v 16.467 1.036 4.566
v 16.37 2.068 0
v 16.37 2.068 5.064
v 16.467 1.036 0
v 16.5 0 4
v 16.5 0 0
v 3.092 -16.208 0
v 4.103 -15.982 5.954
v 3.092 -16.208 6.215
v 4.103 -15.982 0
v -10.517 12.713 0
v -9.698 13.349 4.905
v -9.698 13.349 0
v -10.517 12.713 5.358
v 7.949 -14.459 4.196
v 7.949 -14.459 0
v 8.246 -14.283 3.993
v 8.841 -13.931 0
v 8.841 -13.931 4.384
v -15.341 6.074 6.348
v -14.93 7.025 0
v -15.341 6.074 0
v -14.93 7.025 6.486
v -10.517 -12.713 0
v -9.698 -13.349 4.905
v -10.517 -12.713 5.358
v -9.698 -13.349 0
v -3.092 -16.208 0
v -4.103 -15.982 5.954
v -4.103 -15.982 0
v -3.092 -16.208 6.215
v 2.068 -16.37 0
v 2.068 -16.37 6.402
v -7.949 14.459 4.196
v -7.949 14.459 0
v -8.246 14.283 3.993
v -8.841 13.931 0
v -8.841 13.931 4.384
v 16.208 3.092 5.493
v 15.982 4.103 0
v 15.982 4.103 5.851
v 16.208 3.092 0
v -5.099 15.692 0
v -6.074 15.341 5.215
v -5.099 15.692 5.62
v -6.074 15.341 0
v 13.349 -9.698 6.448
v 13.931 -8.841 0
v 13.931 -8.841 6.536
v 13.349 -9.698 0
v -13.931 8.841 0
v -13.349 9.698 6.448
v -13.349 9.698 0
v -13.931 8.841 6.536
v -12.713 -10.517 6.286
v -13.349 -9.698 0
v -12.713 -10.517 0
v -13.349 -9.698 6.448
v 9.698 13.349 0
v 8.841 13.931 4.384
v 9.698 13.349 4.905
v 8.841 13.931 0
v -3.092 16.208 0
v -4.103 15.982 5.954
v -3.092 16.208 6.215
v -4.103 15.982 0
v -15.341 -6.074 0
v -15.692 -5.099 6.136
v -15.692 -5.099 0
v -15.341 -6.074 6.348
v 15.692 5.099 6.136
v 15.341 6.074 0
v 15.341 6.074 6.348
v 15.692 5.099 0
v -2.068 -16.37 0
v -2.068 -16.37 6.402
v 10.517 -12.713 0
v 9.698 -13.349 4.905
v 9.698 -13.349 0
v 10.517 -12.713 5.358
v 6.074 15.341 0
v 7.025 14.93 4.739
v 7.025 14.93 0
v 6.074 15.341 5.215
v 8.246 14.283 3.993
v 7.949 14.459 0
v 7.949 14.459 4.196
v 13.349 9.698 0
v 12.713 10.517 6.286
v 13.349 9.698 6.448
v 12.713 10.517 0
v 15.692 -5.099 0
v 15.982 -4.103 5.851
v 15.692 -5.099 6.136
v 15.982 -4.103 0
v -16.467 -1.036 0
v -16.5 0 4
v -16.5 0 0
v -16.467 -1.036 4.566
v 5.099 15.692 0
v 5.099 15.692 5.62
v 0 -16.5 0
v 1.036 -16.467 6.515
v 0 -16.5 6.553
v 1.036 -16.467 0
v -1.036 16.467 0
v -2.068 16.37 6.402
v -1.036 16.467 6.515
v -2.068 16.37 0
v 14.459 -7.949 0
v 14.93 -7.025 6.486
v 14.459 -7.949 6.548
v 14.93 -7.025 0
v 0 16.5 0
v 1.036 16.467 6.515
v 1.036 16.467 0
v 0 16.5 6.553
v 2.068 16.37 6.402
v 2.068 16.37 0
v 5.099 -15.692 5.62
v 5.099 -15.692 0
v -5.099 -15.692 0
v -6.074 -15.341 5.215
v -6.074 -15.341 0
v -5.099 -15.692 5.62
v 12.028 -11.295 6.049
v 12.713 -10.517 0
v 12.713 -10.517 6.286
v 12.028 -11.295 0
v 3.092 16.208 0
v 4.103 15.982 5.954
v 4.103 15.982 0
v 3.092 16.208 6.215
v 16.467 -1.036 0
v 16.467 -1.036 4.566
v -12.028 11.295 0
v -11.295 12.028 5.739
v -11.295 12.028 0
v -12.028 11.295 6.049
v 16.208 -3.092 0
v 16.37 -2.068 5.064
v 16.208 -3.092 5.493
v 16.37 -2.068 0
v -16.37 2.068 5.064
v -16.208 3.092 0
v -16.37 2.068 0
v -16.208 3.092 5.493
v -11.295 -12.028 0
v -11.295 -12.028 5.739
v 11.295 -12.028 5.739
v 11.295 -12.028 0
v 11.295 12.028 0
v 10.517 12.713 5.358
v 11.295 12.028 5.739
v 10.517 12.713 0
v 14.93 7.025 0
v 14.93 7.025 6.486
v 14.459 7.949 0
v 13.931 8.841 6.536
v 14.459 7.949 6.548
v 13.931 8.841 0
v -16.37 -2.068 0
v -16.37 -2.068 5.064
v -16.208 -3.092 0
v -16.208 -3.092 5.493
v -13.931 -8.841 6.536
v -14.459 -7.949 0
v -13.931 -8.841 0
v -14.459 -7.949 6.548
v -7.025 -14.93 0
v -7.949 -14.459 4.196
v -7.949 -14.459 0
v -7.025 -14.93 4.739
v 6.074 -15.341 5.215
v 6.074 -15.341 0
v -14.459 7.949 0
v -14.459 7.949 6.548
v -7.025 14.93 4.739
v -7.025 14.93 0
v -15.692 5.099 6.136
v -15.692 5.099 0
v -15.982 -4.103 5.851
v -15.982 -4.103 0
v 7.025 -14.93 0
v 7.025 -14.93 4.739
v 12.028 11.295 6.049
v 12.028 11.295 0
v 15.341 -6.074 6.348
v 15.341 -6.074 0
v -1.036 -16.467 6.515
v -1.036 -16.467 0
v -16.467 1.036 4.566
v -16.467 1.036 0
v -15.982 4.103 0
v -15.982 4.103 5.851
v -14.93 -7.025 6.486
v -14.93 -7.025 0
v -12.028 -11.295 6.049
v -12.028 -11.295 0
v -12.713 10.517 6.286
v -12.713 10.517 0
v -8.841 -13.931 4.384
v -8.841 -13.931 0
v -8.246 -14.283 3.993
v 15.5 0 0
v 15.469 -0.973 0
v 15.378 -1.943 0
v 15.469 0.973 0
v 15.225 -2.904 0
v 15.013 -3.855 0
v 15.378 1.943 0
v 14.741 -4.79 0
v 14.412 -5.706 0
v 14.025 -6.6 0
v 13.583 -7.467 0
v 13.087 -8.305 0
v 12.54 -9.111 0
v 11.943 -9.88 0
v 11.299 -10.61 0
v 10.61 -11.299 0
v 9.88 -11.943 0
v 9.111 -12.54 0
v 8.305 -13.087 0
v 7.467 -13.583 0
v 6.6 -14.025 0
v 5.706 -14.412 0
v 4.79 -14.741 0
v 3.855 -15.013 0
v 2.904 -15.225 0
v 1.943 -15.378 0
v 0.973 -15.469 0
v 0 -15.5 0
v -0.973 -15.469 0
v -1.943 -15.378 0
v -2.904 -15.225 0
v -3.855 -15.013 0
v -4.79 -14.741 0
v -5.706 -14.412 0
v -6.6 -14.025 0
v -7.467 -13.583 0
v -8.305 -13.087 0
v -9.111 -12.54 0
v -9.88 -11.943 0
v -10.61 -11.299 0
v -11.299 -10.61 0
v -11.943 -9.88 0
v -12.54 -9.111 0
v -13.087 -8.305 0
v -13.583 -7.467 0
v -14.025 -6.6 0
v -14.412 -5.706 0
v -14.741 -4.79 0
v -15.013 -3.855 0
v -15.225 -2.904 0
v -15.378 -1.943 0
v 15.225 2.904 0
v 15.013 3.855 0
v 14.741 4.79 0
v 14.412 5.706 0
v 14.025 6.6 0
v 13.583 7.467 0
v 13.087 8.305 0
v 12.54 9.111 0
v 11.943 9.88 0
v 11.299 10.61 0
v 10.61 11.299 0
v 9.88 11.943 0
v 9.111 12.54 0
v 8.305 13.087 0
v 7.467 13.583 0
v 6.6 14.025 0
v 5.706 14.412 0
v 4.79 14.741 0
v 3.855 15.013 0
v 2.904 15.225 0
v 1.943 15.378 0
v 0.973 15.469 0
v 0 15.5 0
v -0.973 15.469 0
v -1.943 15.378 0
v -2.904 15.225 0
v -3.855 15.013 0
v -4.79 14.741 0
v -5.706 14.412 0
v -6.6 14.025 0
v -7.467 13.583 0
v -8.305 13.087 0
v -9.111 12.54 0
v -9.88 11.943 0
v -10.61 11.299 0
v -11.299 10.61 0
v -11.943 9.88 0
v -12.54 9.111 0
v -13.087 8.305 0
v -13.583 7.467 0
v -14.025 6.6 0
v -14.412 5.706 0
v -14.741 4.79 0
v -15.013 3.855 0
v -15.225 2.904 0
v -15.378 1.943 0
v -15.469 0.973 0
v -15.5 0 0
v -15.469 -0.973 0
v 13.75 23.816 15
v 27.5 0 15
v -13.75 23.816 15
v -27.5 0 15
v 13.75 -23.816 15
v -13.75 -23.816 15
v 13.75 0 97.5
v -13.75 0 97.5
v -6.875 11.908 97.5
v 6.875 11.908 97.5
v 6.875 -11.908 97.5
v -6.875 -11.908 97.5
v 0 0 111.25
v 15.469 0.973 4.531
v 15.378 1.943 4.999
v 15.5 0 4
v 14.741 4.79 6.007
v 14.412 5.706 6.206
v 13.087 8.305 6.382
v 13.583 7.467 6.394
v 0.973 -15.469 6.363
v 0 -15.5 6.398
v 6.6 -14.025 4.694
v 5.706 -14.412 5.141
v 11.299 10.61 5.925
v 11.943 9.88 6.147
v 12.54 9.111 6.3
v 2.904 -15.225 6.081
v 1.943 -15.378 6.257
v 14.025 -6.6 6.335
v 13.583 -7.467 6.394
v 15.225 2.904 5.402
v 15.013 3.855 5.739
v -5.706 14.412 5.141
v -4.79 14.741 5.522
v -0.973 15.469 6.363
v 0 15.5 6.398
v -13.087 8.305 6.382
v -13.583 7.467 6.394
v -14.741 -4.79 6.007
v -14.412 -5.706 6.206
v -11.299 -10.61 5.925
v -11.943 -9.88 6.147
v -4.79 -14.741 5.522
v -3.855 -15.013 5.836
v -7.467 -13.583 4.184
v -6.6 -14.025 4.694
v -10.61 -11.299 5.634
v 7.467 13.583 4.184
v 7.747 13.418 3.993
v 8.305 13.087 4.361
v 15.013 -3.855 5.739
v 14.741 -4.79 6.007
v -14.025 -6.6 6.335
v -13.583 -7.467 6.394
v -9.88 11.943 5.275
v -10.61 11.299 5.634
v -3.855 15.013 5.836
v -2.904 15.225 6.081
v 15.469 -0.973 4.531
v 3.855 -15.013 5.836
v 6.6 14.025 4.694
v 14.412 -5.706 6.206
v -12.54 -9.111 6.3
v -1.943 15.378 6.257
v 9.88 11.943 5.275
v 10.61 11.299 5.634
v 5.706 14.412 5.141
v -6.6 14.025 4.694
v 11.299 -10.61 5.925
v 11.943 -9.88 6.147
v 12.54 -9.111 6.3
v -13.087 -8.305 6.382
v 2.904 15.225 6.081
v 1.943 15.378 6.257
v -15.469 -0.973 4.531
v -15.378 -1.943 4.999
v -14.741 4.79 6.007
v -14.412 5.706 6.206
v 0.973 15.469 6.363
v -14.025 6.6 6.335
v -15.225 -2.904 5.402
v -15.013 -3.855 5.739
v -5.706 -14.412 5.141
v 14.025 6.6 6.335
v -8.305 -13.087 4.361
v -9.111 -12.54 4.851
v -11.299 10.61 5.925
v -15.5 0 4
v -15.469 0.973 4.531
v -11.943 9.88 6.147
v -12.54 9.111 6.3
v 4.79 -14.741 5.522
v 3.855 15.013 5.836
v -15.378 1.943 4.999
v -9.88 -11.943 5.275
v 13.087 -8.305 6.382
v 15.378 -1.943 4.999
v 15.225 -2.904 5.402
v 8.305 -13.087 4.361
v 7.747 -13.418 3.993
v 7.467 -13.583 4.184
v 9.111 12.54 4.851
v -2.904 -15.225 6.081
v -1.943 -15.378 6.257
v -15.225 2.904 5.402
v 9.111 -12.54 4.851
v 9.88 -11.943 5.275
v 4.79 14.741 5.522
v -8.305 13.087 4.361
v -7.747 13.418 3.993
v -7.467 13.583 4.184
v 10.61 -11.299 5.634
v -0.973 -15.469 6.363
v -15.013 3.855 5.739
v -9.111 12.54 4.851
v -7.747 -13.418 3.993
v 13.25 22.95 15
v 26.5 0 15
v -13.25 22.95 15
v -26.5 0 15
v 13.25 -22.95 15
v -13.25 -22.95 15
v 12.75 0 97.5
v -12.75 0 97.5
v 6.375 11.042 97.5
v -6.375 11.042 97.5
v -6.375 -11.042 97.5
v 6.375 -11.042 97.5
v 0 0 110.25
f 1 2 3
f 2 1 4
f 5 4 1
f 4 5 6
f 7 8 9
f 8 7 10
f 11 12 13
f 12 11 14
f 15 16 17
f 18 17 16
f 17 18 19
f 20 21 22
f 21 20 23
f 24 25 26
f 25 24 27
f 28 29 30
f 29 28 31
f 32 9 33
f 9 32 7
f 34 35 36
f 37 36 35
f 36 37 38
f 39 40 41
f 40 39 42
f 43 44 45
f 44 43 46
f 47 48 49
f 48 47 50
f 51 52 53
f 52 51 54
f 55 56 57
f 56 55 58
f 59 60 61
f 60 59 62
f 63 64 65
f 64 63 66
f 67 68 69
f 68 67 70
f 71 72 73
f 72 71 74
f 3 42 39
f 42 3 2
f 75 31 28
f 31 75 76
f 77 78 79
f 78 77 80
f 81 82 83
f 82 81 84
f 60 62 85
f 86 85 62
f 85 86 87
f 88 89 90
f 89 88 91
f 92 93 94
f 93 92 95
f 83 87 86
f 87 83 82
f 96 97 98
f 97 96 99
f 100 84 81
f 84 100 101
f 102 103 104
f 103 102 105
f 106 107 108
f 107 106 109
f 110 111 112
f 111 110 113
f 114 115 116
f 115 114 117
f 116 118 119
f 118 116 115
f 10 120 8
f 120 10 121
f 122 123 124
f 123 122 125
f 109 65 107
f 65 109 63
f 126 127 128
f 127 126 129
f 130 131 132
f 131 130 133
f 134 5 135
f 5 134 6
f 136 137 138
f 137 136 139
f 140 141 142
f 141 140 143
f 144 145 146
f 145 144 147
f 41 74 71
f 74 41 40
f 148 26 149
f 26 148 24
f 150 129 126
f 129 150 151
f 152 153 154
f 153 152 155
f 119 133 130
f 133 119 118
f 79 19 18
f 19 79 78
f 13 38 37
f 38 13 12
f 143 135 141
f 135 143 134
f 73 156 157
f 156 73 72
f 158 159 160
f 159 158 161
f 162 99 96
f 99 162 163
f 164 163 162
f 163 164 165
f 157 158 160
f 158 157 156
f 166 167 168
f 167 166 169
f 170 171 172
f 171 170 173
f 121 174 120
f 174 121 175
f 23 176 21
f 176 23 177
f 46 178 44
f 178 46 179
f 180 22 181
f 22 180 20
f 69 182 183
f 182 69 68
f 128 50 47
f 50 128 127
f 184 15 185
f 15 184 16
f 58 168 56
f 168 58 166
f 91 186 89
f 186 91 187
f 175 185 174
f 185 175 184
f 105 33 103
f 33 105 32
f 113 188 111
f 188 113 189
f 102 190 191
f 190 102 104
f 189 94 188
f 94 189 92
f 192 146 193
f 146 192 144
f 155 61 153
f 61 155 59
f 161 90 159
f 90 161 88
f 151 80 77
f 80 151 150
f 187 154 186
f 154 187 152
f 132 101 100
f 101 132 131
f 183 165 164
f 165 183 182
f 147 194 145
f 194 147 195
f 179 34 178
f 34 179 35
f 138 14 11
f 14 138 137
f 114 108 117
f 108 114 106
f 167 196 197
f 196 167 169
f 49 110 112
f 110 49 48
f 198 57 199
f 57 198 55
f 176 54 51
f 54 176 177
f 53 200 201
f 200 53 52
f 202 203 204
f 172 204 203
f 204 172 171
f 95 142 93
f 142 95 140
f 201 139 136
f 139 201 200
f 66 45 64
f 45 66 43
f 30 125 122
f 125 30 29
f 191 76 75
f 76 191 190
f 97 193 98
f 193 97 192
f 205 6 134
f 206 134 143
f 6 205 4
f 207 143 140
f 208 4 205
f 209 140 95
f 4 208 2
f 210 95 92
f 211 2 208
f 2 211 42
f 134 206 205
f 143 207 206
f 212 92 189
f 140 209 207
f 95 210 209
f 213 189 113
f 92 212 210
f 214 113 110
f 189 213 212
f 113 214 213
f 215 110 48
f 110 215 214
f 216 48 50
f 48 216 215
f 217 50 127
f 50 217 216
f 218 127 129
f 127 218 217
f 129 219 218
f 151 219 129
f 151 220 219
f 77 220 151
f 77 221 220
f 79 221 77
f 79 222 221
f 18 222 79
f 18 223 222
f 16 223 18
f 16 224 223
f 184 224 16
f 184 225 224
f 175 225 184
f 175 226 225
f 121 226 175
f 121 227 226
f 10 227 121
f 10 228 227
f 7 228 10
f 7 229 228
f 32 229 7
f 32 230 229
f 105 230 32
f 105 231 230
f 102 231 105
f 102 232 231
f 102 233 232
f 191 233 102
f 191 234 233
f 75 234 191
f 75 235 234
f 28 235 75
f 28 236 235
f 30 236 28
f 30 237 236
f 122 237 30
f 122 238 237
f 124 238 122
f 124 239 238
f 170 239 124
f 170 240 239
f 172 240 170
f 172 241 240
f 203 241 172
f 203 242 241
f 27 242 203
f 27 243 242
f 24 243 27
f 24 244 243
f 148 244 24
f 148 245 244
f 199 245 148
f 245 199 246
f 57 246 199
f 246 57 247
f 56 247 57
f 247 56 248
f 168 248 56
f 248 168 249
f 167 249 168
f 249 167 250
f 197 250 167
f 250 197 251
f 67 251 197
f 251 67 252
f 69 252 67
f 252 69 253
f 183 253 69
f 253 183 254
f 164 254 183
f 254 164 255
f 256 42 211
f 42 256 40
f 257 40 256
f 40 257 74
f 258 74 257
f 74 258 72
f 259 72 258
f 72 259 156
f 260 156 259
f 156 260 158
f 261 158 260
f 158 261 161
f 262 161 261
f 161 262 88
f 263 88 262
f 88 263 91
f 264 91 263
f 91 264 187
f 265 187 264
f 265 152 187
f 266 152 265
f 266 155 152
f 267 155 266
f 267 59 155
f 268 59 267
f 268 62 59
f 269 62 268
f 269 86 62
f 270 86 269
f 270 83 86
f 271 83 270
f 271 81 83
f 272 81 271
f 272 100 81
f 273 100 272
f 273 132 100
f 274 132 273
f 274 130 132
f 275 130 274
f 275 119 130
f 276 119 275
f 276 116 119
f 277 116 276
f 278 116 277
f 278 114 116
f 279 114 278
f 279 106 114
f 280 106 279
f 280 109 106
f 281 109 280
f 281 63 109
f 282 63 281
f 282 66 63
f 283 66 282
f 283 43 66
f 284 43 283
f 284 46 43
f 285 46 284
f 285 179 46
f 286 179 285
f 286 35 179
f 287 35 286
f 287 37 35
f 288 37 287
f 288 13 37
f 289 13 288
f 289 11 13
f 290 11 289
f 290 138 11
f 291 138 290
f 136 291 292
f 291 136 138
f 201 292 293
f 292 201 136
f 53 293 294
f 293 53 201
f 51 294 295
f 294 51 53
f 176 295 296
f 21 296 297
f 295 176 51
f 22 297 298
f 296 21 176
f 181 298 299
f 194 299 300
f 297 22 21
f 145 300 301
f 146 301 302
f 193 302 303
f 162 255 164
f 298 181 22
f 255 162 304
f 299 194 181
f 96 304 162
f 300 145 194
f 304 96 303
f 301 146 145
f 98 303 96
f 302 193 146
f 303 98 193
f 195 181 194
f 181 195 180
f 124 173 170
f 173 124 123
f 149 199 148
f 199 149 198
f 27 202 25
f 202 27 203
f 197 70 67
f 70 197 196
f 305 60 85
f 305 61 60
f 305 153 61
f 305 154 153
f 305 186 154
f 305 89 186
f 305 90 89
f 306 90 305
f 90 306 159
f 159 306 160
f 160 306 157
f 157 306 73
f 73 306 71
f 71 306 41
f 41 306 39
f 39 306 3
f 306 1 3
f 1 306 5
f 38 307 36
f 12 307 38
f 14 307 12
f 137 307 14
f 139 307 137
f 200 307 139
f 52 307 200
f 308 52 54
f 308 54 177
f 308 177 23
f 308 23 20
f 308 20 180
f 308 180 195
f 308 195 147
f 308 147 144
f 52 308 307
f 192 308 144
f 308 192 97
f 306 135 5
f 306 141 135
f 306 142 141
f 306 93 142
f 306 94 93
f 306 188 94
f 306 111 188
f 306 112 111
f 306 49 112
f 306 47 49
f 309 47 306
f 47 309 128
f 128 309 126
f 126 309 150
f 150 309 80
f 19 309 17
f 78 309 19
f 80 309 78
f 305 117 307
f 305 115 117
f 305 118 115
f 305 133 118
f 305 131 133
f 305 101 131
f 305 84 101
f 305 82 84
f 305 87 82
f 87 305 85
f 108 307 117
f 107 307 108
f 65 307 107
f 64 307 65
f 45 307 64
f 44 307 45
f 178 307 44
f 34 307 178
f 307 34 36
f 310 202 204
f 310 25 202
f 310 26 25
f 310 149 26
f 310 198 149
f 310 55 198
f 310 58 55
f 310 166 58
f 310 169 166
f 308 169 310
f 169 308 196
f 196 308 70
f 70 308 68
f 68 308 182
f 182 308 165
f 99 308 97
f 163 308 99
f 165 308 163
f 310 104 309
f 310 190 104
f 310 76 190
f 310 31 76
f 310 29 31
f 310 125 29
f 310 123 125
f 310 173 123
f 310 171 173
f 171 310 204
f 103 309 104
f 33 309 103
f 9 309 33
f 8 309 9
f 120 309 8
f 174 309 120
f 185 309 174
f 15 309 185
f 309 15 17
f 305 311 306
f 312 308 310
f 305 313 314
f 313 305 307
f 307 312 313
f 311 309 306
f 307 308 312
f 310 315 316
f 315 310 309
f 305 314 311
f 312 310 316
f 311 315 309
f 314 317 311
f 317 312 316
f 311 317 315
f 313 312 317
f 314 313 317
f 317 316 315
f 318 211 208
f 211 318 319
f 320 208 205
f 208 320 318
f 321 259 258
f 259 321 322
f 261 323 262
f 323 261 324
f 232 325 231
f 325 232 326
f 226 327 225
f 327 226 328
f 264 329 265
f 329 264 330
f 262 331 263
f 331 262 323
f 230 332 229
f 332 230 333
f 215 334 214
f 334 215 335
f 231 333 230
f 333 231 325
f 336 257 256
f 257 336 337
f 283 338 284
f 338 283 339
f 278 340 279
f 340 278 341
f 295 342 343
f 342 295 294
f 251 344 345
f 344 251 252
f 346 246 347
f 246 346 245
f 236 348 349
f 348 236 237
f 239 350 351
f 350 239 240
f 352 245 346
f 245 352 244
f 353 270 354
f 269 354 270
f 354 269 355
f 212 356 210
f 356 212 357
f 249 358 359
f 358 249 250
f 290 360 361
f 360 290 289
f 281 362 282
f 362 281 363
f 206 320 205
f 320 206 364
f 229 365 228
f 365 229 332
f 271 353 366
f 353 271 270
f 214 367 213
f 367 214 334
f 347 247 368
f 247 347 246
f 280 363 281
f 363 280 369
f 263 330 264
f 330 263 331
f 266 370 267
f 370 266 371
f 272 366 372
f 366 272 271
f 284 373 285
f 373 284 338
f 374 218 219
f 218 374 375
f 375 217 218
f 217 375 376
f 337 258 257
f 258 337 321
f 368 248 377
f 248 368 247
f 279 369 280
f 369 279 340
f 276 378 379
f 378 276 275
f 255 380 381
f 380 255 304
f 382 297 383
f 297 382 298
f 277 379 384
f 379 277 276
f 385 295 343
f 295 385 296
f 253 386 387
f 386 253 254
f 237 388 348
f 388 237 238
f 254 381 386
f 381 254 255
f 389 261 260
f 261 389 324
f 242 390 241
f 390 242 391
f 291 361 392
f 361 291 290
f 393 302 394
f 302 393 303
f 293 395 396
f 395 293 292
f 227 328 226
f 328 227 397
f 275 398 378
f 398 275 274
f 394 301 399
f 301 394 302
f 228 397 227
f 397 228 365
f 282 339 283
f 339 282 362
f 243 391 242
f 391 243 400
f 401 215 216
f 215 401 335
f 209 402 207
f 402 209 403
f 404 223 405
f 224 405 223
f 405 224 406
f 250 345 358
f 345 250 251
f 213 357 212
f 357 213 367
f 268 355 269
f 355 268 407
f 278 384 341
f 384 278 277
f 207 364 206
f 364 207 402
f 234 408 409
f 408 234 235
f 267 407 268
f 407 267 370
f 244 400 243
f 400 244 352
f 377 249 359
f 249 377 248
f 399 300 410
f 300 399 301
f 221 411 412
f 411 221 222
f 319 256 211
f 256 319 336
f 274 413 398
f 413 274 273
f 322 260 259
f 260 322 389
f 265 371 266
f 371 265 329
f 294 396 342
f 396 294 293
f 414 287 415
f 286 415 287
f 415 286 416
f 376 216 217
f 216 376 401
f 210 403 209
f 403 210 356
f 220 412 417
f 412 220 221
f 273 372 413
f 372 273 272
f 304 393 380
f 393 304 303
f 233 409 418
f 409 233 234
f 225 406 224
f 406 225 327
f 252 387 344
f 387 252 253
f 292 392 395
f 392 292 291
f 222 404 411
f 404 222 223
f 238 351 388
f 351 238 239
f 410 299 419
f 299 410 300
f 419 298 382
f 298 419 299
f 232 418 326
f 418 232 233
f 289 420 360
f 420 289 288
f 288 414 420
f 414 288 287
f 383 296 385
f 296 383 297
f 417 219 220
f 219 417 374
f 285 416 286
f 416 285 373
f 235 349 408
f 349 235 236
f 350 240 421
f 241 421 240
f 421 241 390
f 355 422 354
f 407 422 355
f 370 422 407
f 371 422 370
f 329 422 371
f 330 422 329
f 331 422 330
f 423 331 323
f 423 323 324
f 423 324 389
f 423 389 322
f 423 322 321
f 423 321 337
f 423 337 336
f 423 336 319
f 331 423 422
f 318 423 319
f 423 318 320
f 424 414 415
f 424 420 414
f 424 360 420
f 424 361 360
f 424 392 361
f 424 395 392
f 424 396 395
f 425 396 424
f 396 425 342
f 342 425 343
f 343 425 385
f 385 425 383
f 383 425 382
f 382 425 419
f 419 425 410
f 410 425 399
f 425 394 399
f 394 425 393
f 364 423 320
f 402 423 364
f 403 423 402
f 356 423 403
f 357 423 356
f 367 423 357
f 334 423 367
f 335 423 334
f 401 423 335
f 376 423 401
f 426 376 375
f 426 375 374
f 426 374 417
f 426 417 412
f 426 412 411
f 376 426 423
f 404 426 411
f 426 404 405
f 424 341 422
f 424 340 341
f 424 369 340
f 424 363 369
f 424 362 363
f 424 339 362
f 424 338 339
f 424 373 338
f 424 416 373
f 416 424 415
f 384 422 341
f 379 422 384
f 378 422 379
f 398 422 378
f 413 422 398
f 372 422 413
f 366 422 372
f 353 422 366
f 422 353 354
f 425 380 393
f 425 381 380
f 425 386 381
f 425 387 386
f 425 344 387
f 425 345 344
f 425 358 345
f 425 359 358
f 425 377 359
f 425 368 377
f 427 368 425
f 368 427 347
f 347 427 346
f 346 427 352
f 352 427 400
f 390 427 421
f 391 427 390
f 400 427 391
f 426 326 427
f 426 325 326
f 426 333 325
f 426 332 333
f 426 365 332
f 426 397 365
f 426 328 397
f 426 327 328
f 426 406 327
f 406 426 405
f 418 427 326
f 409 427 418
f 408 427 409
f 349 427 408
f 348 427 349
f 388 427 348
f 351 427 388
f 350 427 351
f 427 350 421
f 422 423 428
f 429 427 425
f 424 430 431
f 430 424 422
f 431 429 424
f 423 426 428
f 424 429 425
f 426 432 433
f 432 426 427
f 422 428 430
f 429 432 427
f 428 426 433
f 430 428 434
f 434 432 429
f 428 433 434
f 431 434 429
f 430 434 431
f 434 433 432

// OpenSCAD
//Lamp cap quartz crystal.
//You can adjust the five variables below
base=33;      //Diameter of base for lamp
rim=4;            //Length of rim at base
size=55;        //Diameter of crystal
scaling=1.5;  //Scale of crystal length (default 1.5)
facets=6;       //number of faces (default 6)
//Don't change variables below here
halfsize=size/2;
upper=halfsize-(base/2)+rim;
$fn=facets;
difference(){
union(){
//outer body
translate([0,0,0])
cylinder(h=4+rim,d1=base,d2=base,$fn=100);
translate([0,0,-(base/2)+rim])
cylinder(h=halfsize,d1=0,d2=size);
translate([0,0,upper])
cylinder(h=size*scaling,d1=size,d2=size/2);
translate([0,0,upper+size*scaling])
cylinder(h=size/4,d1=size/2,d2=0);
}
//Inner core.
translate([0,0,-1])
cylinder(h=6+rim,d1=base-2,d2=base-2,$fn=100);
translate([0,0,-(base/2)+rim+1])
cylinder(h=halfsize-1,d1=0,d2=size-2);
translate([0,0,upper])
cylinder(h=size*scaling,d1=size-2,d2=(size/2)-2);
translate([0,0,upper+size*scaling])
cylinder(h=(size/4)-1,d1=(size/2)-2,d2=0);
translate([-halfsize,-halfsize,-halfsize])
cube([size,size,halfsize]);
}
